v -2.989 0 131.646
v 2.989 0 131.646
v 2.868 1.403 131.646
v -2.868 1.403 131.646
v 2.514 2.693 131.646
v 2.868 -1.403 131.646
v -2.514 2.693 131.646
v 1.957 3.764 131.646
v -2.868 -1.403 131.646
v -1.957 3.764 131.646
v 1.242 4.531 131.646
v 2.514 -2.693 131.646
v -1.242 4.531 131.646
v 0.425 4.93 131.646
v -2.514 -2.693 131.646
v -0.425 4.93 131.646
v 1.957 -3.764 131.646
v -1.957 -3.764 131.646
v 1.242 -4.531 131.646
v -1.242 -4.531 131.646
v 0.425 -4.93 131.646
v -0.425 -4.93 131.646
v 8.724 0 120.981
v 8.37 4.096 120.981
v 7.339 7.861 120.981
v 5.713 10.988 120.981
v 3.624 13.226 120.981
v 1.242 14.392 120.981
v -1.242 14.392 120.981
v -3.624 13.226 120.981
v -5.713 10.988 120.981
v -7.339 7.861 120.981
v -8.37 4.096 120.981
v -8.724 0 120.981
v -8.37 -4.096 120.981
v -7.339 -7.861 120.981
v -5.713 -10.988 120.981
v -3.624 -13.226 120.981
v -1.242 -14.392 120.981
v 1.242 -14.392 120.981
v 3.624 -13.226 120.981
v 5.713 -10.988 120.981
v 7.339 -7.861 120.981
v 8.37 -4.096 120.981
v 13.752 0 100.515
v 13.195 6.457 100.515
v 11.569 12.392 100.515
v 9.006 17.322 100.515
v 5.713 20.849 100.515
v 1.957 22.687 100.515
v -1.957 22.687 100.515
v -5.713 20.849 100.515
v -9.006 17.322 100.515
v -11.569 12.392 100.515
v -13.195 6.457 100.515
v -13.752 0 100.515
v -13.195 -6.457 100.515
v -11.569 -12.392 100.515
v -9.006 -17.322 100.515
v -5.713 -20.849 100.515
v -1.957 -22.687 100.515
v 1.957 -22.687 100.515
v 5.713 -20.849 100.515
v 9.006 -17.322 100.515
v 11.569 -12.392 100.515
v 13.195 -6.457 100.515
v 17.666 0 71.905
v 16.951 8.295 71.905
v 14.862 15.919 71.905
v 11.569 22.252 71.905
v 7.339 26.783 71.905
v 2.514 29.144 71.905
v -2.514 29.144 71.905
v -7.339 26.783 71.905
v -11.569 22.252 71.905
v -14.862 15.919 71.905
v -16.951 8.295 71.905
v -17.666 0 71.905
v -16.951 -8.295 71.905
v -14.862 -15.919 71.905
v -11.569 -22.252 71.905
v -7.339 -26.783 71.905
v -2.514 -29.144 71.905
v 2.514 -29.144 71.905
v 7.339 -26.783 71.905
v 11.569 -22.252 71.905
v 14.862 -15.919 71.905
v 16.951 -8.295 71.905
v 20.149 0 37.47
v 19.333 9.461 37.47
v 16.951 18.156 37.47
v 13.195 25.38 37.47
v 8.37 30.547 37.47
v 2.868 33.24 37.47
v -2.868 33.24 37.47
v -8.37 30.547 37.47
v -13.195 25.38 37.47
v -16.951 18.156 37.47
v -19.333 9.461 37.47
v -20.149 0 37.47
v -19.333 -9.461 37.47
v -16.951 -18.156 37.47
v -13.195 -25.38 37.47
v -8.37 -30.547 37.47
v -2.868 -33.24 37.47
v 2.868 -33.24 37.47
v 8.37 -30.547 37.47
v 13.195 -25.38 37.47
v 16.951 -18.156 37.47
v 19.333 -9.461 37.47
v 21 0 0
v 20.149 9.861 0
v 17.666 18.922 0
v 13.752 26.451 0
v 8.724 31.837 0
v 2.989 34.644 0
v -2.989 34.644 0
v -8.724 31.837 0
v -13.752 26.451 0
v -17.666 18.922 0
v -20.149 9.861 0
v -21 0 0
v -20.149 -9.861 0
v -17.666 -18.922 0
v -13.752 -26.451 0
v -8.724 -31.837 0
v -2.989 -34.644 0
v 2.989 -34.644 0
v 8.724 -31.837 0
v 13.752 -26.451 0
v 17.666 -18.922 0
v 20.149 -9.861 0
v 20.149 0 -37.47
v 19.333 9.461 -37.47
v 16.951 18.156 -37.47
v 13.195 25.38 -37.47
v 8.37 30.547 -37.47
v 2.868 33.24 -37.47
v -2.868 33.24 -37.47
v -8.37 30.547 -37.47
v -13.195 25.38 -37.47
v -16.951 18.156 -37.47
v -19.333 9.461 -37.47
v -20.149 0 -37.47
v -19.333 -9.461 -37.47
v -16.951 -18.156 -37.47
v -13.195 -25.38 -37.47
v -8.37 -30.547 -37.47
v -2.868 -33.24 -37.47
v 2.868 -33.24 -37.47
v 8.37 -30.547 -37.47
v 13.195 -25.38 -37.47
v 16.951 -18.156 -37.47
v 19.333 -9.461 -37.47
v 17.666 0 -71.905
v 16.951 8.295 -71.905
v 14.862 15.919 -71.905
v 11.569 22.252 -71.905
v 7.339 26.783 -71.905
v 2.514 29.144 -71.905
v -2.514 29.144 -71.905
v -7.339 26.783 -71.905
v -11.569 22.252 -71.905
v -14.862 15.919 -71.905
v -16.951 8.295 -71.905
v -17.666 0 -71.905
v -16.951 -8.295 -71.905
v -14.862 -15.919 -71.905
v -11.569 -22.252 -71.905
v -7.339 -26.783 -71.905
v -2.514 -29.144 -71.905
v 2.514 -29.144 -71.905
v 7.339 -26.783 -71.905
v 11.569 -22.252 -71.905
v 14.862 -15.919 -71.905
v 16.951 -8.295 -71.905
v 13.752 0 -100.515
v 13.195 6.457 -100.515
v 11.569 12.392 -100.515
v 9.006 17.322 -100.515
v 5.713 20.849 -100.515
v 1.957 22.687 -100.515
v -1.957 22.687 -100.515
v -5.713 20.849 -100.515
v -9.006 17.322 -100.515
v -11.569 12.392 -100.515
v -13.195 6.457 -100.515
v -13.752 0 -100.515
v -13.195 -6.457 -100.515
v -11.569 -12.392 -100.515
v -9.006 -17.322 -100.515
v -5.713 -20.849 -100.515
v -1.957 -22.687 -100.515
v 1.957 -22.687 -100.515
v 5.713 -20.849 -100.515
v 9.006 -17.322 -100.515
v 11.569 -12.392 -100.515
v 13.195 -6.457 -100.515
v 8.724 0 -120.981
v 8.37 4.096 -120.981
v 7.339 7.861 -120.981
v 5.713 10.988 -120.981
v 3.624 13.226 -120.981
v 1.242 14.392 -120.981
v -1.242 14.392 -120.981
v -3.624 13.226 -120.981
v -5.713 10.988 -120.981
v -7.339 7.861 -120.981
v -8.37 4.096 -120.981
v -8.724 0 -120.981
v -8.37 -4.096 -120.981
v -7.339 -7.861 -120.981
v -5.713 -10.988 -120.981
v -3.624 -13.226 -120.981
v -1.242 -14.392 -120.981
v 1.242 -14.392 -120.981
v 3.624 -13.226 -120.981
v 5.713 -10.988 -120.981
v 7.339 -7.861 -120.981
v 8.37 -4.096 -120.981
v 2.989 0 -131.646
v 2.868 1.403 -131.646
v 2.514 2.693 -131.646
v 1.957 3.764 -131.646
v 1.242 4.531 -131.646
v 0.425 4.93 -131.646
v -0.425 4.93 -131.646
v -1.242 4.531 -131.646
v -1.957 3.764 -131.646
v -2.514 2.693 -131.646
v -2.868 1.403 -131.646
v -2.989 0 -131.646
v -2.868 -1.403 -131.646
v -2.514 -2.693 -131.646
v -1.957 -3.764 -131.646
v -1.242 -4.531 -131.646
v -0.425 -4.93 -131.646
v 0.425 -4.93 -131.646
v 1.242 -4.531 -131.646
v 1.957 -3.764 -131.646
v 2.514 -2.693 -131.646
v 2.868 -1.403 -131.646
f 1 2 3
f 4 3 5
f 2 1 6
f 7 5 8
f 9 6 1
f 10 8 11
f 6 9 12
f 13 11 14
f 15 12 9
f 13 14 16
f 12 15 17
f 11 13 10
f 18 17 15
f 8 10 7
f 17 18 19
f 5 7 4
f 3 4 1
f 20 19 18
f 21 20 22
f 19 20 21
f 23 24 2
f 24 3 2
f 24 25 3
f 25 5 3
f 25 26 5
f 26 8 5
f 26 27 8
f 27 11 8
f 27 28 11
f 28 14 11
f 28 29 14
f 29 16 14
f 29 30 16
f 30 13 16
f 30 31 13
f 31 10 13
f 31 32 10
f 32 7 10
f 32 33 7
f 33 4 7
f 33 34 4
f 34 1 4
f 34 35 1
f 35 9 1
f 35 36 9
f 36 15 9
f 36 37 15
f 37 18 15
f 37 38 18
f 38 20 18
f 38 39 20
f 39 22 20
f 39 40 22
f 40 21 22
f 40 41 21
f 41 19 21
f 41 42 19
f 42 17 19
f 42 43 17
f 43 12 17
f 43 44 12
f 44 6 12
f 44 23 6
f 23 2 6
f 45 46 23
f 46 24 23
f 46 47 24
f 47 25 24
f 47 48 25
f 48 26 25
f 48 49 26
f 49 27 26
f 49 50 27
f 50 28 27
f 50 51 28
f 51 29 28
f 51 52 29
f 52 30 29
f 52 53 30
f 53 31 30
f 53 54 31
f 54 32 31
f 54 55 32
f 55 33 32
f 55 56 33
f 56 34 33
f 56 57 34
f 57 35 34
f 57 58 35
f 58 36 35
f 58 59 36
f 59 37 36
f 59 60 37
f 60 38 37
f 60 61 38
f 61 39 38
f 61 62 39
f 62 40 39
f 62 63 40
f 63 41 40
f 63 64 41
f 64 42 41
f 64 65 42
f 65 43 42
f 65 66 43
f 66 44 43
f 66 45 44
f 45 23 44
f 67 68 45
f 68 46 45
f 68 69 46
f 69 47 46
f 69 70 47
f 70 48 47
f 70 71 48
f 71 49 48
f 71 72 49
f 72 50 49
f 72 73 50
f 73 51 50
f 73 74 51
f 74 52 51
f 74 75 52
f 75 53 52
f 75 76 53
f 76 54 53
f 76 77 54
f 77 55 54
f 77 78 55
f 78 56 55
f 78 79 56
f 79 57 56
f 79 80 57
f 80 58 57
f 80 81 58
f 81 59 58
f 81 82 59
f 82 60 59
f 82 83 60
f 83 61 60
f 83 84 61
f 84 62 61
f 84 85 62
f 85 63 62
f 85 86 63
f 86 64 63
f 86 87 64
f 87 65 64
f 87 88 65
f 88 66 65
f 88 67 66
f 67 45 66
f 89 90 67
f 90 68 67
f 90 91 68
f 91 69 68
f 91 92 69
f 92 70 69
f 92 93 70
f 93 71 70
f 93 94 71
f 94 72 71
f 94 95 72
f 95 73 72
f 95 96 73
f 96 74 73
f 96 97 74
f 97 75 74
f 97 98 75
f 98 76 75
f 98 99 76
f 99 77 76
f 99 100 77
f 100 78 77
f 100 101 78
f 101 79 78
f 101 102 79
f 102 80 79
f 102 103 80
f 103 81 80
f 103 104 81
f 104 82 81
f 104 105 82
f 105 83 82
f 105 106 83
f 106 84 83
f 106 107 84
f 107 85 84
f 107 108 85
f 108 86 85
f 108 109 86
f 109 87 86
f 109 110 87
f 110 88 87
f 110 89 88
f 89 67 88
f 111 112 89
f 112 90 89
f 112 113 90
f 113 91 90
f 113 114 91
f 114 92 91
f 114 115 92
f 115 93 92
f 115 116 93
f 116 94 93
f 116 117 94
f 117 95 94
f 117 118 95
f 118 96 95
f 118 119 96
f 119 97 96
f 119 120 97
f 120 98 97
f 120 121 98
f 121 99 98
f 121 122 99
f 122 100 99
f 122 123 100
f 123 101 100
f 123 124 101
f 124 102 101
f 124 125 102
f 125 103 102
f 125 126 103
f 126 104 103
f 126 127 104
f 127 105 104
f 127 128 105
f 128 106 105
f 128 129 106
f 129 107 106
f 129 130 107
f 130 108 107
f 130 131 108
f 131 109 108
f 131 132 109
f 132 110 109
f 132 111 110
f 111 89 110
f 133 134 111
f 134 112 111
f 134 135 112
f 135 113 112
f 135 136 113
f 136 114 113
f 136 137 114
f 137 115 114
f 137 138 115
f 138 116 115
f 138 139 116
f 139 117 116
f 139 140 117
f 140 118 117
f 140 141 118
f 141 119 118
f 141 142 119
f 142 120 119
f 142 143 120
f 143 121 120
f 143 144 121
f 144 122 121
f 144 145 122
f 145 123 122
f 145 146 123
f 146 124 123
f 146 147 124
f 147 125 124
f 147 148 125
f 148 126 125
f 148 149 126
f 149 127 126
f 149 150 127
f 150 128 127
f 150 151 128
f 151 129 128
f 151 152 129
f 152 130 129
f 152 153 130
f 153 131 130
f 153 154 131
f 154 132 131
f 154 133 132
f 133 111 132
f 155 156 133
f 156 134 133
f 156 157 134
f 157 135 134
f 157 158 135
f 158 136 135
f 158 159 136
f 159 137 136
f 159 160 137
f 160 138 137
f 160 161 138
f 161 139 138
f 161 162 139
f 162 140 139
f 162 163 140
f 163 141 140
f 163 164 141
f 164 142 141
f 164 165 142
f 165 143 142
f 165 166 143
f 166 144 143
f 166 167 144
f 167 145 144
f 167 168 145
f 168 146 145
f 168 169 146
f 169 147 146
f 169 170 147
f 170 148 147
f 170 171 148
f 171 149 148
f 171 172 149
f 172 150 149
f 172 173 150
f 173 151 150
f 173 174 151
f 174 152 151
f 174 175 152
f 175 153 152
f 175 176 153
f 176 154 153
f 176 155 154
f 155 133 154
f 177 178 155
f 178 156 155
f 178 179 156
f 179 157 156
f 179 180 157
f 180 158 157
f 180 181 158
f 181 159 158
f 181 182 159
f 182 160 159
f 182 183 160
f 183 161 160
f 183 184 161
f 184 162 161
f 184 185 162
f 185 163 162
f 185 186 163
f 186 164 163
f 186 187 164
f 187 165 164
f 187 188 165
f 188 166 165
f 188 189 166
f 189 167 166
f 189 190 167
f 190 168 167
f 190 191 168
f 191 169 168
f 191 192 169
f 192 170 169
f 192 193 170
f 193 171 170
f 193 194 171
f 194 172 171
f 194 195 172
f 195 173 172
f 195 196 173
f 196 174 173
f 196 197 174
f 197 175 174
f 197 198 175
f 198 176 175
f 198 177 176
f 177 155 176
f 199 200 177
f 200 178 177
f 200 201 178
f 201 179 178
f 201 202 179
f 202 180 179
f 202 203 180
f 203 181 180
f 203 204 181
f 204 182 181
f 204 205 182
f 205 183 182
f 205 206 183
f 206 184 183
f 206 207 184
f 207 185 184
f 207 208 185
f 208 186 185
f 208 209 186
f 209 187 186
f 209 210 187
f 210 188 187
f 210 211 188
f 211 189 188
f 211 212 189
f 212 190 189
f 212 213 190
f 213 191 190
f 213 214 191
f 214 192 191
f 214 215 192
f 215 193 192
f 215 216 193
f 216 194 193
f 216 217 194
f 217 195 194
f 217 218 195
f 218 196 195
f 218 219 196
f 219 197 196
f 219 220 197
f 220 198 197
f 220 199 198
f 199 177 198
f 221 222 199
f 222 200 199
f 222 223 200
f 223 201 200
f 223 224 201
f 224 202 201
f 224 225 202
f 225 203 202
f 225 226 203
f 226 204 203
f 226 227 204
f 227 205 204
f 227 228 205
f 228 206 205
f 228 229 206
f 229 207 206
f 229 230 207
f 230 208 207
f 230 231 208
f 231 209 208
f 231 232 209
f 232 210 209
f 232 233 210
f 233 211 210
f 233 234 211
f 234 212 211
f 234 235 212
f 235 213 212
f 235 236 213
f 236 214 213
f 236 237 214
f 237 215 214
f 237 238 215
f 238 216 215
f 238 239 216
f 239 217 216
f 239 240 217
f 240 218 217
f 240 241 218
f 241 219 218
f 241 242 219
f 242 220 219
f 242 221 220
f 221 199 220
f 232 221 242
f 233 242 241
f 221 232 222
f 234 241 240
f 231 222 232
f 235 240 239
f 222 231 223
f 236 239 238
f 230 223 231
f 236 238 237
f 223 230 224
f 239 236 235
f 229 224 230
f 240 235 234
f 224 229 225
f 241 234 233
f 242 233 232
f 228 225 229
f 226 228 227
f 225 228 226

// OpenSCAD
// Generated by SolidPython 1.0.1 on 2020-07-29 00:46:45


scale(v = [3, 5, 19]) {
	sphere(r = 7);
}
/***********************************************
*********      SolidPython code:      **********
************************************************
 
# import packages: SolidPython
from solid import *
from solid.utils import *
from itertools import chain, combinations, permutations


class Resize:

    def __init__(self, scad_file):
        self.scad_file = scad_file
        #self.scad_file = import_scad(scad_file)
        # cone/cylinder param:
        self.r1 = 0
        self.r2 = 0
        self.h = 0
        # rectangular prism param:
        self.w = 0
        self.l = 0
        # ellipse param:
        self.r = 0

    # import OpenScad code (file name corresponds to shape)


    # classify shape + parameters
    def assign(self, param1, param2, param3):
        if self.scad_file == 'cone.scad':
            self.r1 = param1
            self.r2 = param2
            self.h = param3
        elif self.scad_file == 'cylinder.scad':
            self.r1 = param1
            self.r2 = param2
            self.h = param3
        elif self.scad_file == 'rectangularPrism.scad':
            self.h = param1
            self.l = param2
            self.w = param3
        else:
            self.r = param1
            self.h = param2

    # resize parameters
    def iterate(self):
        x = range(3, 20, 2)
        i = 1
        if self.scad_file == 'cone.scad':
            tempList = list(permutations(x, 2))
            for temp in tempList:
                param1 = temp[0]
                param2 = temp[1]
                filepath = 'produced_scad_files/' + 'cone' + str(param1) + '_' + str(param2) + '_' + '.scad'
                scad_render_to_file(cylinder(h=param1, r1=param2, r2=0), filepath)

        elif self.scad_file == 'cylinder.scad':
            tempList = list(permutations(x, 3))
            for temp in tempList:
                param1 = temp[0]
                param2 = temp[1]
                filepath = 'produced_scad_files/' + 'cylinder' + str(param1) + '_' + str(param2) + '_' + '.scad'
                scad_render_to_file(cylinder(h=param1, r1=param2, r2=param2), filepath)

        elif self.scad_file == 'rectangularPrism.scad':
            tempList = list(permutations(x, 3))
            for temp in tempList:
                param1 = temp[0]
                param2 = temp[1]
                param3 = temp[2]
                filepath = 'produced_scad_files/' + 'rectangularPrism' + str(param1) + '_' + str(param2) + '_' + str(
                    param3) + '.scad'
                scad_render_to_file(cube(size=(param1, param2, param3)), filepath)

        elif self.scad_file == 'ellipse.scad':
            tempList = list(permutations(x, 4))
            for temp in tempList:
                param1 = temp[0]
                param2 = temp[1]
                param3 = temp[2]
                param4 = temp[3]
                filepath = 'produced_scad_files/' + 'ellipse' + str(param1) + '_' + str(param2) + '_' + str(param3) + '_' + str(param4) + '.scad'
                scad_render_to_file(scale([param1, param2, param3])(sphere(r=param4)), filepath)

    def render_to_scadfile(self):
        scad_render_to_file(scad, 'example.scad') 
 
************************************************/
